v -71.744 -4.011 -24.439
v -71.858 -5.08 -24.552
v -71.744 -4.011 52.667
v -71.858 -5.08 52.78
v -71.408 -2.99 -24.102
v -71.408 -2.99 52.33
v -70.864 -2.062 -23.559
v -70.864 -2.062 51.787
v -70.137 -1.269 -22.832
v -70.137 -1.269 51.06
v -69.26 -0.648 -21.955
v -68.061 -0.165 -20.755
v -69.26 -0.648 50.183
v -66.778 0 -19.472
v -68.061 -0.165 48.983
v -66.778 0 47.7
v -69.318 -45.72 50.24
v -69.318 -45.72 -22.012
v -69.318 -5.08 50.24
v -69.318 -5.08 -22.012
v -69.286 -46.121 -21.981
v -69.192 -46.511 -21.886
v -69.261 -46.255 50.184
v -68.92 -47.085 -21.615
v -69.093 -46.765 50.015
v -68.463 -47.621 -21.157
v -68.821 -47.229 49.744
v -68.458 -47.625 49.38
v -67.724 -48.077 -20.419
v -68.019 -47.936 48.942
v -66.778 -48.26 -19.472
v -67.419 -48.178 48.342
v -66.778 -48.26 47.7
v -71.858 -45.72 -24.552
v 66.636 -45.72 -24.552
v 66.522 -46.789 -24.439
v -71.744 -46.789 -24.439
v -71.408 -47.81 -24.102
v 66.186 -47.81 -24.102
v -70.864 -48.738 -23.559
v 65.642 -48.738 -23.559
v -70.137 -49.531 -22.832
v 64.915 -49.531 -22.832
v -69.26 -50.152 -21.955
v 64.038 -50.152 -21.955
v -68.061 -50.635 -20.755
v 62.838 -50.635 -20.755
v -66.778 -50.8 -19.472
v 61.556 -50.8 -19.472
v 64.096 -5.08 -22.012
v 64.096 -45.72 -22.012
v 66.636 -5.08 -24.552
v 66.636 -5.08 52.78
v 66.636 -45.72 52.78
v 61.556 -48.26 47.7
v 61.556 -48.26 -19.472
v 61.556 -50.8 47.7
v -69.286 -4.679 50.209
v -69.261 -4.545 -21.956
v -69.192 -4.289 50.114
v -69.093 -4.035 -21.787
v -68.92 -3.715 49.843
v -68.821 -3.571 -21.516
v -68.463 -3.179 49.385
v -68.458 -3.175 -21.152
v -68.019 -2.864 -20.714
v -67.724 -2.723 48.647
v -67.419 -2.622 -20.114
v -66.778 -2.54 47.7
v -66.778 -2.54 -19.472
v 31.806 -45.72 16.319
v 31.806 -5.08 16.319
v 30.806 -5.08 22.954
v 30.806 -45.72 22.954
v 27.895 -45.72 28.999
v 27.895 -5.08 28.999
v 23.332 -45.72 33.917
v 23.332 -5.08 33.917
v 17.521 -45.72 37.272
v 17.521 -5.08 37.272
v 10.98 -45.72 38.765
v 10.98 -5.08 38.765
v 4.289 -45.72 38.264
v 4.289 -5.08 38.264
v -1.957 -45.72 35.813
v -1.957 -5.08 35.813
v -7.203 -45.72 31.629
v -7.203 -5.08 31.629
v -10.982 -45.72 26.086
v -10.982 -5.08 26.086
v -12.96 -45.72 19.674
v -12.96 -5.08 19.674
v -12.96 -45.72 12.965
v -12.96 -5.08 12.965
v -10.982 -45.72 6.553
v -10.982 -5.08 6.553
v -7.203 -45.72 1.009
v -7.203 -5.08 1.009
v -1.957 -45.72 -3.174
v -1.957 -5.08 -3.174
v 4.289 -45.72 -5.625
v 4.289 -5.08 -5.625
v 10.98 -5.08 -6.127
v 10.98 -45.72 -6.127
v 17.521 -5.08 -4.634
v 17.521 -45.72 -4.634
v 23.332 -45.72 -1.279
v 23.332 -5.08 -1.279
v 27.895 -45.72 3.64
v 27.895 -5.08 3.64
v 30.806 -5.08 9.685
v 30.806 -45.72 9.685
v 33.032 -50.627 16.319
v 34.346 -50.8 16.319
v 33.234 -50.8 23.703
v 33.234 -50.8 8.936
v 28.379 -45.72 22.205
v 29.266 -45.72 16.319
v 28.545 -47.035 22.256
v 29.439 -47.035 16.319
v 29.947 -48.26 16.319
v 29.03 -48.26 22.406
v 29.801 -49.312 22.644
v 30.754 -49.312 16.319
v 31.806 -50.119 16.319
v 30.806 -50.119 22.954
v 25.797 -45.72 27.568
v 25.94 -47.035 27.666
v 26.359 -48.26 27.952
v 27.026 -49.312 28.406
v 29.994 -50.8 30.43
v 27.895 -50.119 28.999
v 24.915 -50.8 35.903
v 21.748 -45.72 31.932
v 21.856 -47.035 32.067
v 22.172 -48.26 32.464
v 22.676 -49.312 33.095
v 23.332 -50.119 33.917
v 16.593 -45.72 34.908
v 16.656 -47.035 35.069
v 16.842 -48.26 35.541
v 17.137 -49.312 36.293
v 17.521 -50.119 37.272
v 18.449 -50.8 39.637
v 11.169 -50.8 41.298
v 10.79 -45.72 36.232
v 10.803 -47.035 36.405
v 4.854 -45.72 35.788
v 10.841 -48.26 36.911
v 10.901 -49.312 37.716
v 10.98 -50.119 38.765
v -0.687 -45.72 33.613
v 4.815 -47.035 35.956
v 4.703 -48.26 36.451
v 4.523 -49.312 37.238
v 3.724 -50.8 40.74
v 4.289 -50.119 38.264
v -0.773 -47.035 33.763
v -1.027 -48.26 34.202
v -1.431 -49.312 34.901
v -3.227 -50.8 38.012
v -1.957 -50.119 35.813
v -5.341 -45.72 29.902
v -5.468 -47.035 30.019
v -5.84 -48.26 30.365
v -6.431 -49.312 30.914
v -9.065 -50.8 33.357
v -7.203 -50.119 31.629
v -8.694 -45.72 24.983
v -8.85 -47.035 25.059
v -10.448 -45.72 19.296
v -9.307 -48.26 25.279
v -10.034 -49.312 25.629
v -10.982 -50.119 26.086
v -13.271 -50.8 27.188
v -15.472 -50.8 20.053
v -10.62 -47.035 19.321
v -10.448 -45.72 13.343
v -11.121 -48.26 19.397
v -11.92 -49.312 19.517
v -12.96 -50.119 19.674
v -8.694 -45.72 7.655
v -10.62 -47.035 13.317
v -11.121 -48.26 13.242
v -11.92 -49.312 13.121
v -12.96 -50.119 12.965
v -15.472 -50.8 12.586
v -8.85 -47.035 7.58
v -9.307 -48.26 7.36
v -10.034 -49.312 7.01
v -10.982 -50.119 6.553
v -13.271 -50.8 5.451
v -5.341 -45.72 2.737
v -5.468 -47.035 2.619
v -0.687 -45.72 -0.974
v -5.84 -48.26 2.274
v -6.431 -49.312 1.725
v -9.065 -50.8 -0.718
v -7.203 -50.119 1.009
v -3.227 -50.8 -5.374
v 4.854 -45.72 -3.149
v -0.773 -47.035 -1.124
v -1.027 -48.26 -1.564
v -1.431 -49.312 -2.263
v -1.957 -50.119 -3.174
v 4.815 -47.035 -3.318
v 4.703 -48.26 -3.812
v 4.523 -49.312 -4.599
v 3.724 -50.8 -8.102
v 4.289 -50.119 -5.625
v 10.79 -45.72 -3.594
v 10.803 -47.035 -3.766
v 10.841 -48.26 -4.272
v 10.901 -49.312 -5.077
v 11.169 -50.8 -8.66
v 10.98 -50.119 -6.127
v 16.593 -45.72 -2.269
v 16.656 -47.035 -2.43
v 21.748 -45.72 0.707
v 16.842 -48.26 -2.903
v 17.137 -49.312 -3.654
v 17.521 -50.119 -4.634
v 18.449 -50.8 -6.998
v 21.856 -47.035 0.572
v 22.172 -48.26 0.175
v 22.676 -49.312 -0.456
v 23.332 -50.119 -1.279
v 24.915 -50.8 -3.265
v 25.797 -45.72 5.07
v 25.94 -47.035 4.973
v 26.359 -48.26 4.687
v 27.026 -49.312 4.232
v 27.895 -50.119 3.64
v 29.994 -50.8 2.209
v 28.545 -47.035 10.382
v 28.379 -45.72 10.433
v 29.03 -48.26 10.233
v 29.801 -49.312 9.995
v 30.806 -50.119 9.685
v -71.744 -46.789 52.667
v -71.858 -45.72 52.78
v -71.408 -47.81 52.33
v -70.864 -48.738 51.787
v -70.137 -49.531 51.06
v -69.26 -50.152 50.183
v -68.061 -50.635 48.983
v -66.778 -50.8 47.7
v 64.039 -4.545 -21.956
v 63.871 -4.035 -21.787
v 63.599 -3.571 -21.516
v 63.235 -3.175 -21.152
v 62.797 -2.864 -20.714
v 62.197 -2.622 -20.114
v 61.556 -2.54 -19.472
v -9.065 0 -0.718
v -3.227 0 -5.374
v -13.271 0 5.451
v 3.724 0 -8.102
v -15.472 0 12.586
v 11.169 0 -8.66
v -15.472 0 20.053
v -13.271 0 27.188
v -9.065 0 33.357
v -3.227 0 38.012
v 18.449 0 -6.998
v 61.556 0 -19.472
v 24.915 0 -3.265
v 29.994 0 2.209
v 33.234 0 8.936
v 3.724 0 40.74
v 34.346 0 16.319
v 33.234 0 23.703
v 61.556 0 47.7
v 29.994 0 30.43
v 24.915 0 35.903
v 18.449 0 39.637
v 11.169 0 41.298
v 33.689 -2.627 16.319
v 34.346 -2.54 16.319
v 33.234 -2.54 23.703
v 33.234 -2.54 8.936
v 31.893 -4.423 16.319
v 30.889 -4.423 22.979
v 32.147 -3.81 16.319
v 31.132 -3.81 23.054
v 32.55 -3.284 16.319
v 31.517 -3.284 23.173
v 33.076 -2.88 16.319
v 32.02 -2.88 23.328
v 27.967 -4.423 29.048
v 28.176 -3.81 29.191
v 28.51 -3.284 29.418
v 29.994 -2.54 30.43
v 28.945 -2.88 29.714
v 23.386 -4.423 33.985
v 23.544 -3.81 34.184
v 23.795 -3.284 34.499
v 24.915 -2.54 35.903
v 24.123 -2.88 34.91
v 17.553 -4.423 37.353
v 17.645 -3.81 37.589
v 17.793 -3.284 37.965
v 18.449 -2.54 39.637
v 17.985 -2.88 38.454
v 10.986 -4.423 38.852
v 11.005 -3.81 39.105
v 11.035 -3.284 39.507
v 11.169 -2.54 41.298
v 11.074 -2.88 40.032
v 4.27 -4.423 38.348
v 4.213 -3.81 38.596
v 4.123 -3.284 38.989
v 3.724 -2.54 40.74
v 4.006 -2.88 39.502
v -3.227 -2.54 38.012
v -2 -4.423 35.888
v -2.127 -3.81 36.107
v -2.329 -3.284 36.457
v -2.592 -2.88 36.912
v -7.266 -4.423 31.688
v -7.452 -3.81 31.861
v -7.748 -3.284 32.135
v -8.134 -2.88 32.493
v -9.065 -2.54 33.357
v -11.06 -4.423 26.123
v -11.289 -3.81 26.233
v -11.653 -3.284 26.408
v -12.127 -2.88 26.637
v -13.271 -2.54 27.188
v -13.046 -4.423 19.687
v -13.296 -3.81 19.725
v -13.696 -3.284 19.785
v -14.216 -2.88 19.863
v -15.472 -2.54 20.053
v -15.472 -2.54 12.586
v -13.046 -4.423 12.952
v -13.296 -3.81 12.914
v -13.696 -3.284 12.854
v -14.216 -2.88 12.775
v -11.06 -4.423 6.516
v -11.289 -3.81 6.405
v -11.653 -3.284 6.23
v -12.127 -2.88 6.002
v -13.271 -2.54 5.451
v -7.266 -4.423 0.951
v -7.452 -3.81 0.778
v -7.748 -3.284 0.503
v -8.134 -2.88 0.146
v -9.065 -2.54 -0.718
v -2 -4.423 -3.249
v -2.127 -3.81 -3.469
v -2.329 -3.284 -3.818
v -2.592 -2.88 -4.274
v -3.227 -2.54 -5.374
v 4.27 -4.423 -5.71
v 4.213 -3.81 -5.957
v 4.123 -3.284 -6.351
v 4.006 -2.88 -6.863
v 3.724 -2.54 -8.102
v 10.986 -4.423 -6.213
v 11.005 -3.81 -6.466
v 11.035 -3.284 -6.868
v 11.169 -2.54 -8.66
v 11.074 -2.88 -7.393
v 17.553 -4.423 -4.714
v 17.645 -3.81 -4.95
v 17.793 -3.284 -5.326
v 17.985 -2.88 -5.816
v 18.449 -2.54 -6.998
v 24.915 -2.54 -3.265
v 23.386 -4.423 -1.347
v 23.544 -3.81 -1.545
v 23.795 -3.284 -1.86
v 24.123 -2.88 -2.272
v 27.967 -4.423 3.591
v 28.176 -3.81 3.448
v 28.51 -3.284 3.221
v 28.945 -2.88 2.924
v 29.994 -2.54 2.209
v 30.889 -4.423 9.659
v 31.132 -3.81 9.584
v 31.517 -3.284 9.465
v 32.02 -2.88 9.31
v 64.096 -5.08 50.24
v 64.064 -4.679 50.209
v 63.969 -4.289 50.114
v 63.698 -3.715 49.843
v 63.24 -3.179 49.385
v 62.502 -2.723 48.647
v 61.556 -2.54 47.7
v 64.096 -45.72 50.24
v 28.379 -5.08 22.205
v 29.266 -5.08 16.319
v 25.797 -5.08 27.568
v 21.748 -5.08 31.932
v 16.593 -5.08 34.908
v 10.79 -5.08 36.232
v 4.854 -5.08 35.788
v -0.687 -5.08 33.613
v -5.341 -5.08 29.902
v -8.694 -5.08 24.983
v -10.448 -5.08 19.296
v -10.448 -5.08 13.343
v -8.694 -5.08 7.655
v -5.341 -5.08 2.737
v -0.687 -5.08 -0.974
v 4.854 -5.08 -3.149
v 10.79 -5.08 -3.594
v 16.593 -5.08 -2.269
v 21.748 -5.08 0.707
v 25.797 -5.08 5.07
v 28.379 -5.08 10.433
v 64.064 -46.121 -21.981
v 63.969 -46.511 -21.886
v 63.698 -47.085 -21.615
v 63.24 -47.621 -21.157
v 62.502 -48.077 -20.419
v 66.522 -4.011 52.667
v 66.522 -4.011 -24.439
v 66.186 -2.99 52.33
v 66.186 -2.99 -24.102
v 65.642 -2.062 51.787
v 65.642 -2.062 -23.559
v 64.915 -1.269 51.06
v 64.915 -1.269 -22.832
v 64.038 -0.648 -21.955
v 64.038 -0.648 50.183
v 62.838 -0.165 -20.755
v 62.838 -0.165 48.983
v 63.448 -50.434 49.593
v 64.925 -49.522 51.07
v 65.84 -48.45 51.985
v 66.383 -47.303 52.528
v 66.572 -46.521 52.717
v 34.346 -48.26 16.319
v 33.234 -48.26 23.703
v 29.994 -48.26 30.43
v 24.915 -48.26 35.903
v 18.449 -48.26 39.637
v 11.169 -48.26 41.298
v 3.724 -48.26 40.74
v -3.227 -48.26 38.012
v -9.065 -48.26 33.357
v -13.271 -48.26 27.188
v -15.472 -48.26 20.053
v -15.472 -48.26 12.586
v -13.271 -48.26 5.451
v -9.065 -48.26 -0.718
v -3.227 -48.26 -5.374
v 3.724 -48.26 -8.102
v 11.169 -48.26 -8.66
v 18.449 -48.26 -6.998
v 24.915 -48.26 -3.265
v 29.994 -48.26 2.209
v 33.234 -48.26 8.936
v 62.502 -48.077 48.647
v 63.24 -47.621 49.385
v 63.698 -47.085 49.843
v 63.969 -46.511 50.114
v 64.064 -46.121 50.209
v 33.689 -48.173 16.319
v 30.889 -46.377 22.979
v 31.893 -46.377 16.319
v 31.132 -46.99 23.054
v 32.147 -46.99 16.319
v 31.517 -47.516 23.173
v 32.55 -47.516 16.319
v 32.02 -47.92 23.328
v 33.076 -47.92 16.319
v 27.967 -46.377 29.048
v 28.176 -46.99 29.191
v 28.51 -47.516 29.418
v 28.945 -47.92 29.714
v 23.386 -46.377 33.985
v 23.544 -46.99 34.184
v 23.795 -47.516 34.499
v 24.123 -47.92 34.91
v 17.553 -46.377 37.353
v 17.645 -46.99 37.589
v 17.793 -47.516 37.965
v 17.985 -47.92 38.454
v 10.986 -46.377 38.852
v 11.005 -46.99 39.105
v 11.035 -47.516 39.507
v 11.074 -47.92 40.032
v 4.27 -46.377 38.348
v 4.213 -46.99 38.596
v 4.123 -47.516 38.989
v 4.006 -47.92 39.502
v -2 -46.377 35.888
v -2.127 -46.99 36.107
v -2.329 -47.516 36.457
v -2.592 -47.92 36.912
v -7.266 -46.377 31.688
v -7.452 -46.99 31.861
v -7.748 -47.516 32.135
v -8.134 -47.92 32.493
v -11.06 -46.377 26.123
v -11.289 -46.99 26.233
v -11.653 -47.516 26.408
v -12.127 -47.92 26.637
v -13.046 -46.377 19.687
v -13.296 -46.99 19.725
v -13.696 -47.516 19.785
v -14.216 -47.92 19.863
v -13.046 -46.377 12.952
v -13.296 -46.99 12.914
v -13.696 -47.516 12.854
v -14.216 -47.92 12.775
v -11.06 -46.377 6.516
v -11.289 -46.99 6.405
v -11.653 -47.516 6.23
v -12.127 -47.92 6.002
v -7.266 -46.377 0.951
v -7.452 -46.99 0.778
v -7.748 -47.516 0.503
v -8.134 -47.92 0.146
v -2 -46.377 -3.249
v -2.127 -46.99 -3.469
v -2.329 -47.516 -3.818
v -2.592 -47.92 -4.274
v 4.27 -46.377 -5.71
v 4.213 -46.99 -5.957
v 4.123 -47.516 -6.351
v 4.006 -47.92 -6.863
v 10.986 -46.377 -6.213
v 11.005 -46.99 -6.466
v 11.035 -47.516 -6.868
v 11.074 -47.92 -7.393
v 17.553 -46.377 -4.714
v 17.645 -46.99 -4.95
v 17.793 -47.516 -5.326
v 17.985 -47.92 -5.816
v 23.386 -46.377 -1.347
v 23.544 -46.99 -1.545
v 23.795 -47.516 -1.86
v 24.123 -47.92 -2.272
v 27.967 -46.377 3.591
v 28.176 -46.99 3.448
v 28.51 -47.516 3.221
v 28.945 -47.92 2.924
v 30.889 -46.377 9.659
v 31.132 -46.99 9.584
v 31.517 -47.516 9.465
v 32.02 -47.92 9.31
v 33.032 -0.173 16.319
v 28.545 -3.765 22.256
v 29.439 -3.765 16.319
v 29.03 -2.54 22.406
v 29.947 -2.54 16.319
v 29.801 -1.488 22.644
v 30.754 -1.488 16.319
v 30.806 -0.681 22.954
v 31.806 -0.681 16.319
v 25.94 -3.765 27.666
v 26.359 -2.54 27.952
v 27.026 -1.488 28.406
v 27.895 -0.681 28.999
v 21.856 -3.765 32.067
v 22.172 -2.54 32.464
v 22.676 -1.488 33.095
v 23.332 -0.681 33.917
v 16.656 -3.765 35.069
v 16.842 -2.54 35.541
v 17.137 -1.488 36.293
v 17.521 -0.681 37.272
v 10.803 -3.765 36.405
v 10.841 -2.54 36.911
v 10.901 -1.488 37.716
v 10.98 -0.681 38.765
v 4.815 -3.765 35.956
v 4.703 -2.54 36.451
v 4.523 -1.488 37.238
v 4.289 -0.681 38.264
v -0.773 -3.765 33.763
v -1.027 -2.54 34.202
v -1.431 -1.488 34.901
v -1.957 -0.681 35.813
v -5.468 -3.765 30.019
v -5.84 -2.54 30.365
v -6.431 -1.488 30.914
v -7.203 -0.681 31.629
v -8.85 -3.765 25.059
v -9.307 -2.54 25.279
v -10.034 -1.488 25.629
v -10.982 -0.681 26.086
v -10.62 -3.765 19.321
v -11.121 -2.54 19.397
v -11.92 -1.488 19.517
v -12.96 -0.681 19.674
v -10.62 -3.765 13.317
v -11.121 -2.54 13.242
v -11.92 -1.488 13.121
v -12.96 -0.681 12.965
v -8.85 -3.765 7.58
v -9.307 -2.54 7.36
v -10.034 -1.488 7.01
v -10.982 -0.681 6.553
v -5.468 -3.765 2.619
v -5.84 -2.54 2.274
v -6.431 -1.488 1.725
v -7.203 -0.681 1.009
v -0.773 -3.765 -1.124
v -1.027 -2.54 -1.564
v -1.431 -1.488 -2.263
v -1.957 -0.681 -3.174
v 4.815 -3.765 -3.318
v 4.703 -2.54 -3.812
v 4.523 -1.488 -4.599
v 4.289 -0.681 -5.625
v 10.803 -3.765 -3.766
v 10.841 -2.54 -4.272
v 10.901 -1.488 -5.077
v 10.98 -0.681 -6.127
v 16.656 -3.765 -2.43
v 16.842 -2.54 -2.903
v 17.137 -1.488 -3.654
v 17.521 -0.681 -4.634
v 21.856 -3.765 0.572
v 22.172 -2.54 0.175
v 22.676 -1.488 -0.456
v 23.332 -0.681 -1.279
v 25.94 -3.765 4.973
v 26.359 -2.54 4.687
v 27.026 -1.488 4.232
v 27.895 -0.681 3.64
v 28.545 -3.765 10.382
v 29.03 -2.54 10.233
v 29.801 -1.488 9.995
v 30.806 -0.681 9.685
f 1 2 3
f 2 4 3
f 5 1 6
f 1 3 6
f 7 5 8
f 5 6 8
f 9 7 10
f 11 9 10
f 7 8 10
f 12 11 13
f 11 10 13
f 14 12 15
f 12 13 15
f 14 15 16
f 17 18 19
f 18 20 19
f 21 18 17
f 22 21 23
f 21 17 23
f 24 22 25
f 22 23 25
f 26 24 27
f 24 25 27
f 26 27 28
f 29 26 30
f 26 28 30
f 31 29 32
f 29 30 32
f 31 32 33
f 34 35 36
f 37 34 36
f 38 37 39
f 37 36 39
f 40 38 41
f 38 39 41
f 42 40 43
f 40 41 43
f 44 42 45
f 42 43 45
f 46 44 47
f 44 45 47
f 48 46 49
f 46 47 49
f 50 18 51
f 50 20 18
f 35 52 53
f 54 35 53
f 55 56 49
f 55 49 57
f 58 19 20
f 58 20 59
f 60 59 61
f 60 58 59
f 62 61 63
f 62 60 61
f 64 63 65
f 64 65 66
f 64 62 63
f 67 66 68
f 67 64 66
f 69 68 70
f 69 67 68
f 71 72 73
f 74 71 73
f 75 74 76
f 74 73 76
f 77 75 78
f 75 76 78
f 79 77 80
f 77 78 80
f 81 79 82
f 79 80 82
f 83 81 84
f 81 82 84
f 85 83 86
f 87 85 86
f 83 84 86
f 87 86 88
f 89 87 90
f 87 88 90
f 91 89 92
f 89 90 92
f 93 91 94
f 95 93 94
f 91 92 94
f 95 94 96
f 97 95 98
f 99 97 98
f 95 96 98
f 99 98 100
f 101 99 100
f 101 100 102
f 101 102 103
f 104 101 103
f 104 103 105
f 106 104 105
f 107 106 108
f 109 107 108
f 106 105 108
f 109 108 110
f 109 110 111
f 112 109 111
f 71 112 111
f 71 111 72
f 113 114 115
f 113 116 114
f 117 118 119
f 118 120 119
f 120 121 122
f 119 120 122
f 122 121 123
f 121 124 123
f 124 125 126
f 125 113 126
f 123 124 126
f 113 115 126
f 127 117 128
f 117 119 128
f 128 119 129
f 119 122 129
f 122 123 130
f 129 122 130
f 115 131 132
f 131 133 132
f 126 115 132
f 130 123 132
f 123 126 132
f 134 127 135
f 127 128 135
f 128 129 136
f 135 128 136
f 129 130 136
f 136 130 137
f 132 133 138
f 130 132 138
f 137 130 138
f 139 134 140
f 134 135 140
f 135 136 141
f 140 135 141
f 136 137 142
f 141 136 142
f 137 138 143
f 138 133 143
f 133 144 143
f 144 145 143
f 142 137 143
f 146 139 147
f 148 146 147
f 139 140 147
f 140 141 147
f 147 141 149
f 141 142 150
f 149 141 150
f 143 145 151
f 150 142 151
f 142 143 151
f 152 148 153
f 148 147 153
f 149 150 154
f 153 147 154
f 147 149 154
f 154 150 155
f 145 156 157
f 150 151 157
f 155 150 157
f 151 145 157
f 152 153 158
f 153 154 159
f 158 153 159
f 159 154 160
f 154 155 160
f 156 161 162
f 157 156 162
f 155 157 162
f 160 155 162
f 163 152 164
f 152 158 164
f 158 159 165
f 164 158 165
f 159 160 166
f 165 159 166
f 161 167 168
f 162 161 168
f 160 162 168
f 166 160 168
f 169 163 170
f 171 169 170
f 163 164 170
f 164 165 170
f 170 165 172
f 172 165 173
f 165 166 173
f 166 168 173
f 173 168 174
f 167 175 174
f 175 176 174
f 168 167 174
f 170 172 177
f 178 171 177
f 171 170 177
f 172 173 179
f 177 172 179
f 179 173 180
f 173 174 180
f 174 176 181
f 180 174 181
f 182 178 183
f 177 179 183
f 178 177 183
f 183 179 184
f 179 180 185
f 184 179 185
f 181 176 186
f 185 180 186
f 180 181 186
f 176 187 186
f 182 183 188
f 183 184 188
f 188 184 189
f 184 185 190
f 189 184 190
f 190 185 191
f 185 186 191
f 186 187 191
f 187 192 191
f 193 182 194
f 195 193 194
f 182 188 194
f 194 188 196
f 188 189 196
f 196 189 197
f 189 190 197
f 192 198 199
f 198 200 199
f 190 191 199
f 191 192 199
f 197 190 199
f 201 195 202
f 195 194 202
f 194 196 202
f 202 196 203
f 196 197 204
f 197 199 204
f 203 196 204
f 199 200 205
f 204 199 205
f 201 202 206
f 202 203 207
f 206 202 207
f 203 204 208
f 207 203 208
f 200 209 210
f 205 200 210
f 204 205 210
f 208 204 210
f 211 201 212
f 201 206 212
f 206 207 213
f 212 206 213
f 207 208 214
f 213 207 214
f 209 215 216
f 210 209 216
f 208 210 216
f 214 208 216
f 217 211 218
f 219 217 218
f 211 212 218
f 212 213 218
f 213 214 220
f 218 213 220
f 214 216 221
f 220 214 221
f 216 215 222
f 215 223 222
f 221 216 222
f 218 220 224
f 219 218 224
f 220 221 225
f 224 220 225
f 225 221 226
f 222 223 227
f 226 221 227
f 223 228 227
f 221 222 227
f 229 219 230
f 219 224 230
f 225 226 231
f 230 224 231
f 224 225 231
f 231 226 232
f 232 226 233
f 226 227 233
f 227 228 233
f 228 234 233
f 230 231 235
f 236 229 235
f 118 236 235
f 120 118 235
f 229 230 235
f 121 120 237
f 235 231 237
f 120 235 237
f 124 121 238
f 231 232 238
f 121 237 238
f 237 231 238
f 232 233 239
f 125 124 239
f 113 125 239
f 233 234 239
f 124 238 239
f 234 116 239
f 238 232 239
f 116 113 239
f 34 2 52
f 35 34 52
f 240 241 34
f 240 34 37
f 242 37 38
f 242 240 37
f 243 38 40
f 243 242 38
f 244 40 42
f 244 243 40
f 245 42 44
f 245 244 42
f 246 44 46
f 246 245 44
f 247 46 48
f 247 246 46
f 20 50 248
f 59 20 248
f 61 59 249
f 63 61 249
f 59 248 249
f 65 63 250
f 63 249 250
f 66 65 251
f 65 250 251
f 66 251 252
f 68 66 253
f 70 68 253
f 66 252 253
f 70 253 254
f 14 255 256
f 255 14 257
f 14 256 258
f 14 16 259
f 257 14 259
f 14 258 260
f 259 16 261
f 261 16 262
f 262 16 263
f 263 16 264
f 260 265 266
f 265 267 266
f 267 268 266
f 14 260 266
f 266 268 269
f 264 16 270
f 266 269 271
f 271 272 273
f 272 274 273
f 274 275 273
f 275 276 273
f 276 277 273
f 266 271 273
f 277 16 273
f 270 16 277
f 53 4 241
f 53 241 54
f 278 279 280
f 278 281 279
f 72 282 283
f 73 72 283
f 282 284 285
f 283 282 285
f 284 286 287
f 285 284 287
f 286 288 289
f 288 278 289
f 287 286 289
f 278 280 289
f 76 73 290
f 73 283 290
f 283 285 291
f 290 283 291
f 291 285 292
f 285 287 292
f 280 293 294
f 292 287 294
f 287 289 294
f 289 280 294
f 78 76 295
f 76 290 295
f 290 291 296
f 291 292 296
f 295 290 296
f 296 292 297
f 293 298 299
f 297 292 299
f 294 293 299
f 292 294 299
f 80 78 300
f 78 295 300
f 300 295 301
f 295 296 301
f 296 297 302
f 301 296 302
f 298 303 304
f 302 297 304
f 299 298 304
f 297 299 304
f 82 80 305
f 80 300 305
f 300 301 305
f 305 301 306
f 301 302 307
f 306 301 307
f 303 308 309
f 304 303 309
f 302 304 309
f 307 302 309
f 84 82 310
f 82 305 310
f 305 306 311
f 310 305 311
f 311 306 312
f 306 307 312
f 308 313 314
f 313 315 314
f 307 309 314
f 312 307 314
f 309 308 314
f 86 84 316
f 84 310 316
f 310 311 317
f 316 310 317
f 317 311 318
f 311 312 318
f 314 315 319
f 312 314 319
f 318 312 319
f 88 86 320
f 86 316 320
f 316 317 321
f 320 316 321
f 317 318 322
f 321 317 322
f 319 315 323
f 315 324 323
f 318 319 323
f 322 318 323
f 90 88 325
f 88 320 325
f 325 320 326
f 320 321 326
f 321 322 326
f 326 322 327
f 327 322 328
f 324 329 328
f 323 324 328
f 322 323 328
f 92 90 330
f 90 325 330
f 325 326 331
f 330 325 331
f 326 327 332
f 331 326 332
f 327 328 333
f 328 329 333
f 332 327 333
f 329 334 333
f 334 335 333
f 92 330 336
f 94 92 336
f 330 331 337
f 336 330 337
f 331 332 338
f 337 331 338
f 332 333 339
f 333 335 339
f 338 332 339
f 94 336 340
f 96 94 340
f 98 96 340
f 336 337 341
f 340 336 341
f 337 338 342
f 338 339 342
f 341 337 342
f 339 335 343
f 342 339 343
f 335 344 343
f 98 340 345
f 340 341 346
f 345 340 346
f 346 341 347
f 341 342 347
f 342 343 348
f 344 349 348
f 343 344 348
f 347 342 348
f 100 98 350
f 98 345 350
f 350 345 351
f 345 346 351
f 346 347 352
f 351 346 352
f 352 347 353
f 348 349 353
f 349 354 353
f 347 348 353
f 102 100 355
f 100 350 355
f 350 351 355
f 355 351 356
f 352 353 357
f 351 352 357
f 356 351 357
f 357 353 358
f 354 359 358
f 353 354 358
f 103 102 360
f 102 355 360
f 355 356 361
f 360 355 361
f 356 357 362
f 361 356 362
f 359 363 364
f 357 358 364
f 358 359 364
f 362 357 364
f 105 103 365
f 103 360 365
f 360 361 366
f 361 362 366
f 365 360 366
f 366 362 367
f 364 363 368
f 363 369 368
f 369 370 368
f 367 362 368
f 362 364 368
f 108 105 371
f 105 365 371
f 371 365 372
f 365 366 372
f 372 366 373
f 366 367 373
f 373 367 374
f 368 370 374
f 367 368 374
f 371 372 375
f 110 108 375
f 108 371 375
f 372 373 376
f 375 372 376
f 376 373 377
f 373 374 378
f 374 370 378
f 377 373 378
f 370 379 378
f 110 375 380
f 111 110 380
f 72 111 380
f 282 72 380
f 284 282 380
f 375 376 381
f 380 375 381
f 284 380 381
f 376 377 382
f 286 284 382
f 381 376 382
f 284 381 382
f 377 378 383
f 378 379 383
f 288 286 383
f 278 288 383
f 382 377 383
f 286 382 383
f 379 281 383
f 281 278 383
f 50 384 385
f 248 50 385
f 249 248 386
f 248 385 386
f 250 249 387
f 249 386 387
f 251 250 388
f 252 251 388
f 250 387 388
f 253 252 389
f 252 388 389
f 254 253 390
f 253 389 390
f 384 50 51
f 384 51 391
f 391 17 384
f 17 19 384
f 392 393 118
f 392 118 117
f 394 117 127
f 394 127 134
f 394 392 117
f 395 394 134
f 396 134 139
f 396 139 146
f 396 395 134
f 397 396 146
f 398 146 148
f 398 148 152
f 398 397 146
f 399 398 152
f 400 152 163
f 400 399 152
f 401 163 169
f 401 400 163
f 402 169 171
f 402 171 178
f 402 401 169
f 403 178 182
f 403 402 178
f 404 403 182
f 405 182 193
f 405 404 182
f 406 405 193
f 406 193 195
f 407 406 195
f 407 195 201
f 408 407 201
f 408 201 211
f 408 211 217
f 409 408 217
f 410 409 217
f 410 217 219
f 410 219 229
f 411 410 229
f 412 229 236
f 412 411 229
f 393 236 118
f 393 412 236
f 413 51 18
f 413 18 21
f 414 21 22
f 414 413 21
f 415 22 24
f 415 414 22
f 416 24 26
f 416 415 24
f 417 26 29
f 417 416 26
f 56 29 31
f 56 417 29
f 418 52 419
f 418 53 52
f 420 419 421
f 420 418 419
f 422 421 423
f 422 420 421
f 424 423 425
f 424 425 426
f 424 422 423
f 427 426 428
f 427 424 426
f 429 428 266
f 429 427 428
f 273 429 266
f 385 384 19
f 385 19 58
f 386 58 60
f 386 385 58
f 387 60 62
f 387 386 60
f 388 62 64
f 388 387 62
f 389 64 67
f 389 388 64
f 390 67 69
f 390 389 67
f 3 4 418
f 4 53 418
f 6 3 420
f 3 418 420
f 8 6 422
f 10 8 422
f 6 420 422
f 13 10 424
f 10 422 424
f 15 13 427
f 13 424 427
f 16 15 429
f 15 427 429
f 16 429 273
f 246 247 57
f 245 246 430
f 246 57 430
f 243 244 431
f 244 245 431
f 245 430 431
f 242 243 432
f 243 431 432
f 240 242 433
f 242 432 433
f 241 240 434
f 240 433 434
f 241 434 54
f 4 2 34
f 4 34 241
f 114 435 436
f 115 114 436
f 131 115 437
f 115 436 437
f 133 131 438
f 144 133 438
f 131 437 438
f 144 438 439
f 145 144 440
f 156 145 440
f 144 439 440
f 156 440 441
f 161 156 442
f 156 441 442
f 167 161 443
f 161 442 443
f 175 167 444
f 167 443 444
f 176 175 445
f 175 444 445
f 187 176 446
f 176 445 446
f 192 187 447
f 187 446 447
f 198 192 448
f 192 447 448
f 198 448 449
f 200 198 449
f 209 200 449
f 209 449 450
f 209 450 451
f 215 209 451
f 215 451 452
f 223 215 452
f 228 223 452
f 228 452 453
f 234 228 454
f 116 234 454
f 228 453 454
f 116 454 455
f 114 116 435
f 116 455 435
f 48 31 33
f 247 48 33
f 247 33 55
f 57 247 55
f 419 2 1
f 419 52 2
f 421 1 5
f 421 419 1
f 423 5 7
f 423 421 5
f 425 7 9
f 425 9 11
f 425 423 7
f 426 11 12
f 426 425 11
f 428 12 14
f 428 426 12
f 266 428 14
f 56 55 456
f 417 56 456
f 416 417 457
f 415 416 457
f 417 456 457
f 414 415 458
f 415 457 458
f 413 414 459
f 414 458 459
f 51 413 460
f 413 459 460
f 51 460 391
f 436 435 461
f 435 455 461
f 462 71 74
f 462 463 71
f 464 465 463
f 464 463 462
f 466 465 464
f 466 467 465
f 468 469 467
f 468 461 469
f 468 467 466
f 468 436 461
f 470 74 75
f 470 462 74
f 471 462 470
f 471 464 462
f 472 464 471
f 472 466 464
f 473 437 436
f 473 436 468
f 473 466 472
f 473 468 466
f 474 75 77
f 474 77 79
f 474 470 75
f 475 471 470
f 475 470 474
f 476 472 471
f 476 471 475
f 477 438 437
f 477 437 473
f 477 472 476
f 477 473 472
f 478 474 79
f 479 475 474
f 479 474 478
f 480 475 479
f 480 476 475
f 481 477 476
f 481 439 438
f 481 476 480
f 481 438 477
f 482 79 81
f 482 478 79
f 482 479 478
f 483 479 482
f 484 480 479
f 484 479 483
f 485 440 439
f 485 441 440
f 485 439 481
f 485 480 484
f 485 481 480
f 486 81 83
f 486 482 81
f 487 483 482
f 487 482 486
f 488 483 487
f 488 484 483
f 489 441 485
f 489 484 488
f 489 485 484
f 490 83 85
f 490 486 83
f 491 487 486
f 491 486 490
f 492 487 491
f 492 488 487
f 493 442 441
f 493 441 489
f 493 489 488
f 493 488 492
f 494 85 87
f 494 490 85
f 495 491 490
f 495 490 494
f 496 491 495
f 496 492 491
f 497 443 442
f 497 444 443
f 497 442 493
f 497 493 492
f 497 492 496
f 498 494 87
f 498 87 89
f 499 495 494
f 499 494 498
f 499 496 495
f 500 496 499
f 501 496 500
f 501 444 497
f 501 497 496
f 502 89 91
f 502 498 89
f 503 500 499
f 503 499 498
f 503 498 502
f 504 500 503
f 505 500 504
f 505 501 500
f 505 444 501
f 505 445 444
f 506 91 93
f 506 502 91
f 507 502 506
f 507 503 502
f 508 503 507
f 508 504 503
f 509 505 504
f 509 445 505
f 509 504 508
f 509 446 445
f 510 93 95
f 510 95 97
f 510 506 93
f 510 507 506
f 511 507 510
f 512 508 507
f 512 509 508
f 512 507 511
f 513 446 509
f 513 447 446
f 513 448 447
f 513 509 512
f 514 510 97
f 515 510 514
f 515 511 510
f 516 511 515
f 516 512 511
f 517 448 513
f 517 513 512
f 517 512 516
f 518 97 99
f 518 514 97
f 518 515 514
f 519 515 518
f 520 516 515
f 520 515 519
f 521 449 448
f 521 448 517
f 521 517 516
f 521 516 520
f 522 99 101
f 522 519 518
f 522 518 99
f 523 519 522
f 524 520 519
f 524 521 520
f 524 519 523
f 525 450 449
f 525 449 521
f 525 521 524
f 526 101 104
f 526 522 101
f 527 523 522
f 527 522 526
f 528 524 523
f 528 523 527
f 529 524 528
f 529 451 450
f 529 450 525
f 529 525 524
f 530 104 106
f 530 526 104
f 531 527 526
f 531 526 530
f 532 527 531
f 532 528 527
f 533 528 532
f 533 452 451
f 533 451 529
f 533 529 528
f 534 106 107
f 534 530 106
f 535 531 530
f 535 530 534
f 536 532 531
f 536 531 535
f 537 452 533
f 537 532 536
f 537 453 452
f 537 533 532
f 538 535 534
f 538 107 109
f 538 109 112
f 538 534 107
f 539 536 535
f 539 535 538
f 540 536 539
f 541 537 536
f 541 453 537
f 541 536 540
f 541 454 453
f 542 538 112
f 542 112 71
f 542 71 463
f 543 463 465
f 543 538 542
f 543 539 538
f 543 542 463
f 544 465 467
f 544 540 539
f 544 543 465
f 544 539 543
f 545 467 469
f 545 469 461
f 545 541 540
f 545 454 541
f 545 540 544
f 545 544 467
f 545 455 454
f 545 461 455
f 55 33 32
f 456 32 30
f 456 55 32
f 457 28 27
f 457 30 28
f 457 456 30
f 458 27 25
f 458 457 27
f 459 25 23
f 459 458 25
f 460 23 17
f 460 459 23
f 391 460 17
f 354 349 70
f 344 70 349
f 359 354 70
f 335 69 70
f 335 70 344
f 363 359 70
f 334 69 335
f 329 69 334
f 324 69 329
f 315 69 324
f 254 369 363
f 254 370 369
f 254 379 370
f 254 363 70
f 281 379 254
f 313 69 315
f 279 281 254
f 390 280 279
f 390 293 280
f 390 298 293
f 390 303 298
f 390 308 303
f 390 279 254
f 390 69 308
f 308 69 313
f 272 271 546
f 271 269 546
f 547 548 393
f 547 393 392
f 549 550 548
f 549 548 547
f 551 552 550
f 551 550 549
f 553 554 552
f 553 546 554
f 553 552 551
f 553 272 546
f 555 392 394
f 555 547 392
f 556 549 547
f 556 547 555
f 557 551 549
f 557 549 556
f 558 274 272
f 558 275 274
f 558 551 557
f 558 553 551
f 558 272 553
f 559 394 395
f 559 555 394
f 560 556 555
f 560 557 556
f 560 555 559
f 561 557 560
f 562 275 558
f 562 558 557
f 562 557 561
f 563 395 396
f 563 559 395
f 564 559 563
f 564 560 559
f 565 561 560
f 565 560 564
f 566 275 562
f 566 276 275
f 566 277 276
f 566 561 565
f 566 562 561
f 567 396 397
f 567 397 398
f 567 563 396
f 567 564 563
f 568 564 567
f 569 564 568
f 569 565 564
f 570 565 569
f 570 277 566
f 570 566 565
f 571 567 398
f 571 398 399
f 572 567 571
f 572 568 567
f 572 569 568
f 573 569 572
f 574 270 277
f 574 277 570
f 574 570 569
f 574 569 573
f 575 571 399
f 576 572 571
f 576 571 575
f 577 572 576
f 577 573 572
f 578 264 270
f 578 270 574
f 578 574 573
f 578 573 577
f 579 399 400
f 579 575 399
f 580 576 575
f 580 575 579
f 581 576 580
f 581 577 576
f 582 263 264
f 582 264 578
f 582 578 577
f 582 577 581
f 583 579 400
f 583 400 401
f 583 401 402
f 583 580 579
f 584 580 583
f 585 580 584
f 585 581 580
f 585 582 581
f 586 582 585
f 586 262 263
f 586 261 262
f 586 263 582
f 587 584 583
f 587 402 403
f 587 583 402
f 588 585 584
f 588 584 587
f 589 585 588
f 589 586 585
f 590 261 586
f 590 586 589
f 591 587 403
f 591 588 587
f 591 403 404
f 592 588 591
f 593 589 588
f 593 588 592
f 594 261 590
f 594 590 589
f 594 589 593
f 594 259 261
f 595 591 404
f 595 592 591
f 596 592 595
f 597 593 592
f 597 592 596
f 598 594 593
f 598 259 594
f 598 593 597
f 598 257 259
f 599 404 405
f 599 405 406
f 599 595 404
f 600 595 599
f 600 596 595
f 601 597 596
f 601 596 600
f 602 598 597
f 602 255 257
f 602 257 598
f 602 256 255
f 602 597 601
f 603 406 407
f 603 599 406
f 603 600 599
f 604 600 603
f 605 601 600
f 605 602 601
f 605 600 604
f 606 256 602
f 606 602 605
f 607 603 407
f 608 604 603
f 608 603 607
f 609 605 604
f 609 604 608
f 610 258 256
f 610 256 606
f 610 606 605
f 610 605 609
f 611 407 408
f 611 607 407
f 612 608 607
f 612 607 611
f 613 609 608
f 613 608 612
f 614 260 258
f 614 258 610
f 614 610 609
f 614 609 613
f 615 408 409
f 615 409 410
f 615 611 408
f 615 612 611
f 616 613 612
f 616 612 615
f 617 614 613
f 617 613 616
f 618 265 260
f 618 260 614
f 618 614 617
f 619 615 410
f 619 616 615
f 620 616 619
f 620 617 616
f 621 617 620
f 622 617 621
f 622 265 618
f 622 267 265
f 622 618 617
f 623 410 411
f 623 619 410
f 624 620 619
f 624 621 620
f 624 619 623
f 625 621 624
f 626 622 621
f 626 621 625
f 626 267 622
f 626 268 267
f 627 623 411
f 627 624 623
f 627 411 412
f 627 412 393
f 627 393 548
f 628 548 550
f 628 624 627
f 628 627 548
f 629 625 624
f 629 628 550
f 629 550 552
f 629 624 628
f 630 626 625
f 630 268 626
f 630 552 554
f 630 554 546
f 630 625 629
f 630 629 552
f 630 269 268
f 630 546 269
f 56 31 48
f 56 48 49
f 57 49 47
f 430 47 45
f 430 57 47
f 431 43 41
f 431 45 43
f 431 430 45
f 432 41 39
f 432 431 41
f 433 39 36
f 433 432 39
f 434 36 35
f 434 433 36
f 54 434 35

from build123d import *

# Parameters (mm, degrees)
F0_W     = 138.4936049581
F0_H     = 77.3329418153
F0_R     = 19.9688682615
F1_DEPTH = 50.8
F2_R     = 5.08
F3_R     = 5.08
F4_T     = -2.54


# Not quite as in the source:
# - a shell that OpenCascade refuses in one call is made with other operations: the cavity is built on its own and cut out


with BuildPart() as f1:
    # F0 (on Front) → F1 (new body)
    with BuildSketch(Plane.XZ):
        with Locations((-2.6111938059, 14.1139933839)):
            Rectangle(F0_W, F0_H)
        with Locations((9.2974901199, 16.3193047047)):
            Circle(F0_R, mode=Mode.SUBTRACT)
    extrude(amount=F1_DEPTH)

    # F2
    f2_edges = [f1.edges().sort_by_distance(p)[0] for p in [
        (66.635609, 0, 14.113993),
        (-2.611194, 0, 52.780464),
        (-71.857996, 0, 14.113993),
        (-2.611194, 0, -24.552478),
        (-10.671378, 0, 16.319305),
        (-10.671378, -50.8, 16.319305),
    ]]
    fillet(f2_edges, radius=F2_R)

    # F3
    f3_edges = [f1.edges().sort_by_distance(p)[0] for p in [
        (-2.611194, -50.8, -24.552478),
        (-71.857996, -50.8, 14.113993),
        (-2.611194, -50.8, 52.780464),
        (66.635609, -50.8, 14.113993),
    ]]
    fillet(f3_edges, radius=F3_R)

    # F4: a shell. OpenCascade refuses it in one call, so the cavity is built on its own and cut out:
    # the body offset inwards by the wall thickness, plus a prism from it out through each open face.
    f4_core = offset(f1.part, amount=F4_T, mode=Mode.PRIVATE)
    f4_exits = [f4_core.faces().sort_by_distance(p)[0] for p in [
        (-2.611194, -48.26, -18.023971),
    ]]
    add(f4_core, mode=Mode.SUBTRACT)
    extrude(f4_exits, amount=-F4_T, mode=Mode.SUBTRACT)


solid = f1.part
